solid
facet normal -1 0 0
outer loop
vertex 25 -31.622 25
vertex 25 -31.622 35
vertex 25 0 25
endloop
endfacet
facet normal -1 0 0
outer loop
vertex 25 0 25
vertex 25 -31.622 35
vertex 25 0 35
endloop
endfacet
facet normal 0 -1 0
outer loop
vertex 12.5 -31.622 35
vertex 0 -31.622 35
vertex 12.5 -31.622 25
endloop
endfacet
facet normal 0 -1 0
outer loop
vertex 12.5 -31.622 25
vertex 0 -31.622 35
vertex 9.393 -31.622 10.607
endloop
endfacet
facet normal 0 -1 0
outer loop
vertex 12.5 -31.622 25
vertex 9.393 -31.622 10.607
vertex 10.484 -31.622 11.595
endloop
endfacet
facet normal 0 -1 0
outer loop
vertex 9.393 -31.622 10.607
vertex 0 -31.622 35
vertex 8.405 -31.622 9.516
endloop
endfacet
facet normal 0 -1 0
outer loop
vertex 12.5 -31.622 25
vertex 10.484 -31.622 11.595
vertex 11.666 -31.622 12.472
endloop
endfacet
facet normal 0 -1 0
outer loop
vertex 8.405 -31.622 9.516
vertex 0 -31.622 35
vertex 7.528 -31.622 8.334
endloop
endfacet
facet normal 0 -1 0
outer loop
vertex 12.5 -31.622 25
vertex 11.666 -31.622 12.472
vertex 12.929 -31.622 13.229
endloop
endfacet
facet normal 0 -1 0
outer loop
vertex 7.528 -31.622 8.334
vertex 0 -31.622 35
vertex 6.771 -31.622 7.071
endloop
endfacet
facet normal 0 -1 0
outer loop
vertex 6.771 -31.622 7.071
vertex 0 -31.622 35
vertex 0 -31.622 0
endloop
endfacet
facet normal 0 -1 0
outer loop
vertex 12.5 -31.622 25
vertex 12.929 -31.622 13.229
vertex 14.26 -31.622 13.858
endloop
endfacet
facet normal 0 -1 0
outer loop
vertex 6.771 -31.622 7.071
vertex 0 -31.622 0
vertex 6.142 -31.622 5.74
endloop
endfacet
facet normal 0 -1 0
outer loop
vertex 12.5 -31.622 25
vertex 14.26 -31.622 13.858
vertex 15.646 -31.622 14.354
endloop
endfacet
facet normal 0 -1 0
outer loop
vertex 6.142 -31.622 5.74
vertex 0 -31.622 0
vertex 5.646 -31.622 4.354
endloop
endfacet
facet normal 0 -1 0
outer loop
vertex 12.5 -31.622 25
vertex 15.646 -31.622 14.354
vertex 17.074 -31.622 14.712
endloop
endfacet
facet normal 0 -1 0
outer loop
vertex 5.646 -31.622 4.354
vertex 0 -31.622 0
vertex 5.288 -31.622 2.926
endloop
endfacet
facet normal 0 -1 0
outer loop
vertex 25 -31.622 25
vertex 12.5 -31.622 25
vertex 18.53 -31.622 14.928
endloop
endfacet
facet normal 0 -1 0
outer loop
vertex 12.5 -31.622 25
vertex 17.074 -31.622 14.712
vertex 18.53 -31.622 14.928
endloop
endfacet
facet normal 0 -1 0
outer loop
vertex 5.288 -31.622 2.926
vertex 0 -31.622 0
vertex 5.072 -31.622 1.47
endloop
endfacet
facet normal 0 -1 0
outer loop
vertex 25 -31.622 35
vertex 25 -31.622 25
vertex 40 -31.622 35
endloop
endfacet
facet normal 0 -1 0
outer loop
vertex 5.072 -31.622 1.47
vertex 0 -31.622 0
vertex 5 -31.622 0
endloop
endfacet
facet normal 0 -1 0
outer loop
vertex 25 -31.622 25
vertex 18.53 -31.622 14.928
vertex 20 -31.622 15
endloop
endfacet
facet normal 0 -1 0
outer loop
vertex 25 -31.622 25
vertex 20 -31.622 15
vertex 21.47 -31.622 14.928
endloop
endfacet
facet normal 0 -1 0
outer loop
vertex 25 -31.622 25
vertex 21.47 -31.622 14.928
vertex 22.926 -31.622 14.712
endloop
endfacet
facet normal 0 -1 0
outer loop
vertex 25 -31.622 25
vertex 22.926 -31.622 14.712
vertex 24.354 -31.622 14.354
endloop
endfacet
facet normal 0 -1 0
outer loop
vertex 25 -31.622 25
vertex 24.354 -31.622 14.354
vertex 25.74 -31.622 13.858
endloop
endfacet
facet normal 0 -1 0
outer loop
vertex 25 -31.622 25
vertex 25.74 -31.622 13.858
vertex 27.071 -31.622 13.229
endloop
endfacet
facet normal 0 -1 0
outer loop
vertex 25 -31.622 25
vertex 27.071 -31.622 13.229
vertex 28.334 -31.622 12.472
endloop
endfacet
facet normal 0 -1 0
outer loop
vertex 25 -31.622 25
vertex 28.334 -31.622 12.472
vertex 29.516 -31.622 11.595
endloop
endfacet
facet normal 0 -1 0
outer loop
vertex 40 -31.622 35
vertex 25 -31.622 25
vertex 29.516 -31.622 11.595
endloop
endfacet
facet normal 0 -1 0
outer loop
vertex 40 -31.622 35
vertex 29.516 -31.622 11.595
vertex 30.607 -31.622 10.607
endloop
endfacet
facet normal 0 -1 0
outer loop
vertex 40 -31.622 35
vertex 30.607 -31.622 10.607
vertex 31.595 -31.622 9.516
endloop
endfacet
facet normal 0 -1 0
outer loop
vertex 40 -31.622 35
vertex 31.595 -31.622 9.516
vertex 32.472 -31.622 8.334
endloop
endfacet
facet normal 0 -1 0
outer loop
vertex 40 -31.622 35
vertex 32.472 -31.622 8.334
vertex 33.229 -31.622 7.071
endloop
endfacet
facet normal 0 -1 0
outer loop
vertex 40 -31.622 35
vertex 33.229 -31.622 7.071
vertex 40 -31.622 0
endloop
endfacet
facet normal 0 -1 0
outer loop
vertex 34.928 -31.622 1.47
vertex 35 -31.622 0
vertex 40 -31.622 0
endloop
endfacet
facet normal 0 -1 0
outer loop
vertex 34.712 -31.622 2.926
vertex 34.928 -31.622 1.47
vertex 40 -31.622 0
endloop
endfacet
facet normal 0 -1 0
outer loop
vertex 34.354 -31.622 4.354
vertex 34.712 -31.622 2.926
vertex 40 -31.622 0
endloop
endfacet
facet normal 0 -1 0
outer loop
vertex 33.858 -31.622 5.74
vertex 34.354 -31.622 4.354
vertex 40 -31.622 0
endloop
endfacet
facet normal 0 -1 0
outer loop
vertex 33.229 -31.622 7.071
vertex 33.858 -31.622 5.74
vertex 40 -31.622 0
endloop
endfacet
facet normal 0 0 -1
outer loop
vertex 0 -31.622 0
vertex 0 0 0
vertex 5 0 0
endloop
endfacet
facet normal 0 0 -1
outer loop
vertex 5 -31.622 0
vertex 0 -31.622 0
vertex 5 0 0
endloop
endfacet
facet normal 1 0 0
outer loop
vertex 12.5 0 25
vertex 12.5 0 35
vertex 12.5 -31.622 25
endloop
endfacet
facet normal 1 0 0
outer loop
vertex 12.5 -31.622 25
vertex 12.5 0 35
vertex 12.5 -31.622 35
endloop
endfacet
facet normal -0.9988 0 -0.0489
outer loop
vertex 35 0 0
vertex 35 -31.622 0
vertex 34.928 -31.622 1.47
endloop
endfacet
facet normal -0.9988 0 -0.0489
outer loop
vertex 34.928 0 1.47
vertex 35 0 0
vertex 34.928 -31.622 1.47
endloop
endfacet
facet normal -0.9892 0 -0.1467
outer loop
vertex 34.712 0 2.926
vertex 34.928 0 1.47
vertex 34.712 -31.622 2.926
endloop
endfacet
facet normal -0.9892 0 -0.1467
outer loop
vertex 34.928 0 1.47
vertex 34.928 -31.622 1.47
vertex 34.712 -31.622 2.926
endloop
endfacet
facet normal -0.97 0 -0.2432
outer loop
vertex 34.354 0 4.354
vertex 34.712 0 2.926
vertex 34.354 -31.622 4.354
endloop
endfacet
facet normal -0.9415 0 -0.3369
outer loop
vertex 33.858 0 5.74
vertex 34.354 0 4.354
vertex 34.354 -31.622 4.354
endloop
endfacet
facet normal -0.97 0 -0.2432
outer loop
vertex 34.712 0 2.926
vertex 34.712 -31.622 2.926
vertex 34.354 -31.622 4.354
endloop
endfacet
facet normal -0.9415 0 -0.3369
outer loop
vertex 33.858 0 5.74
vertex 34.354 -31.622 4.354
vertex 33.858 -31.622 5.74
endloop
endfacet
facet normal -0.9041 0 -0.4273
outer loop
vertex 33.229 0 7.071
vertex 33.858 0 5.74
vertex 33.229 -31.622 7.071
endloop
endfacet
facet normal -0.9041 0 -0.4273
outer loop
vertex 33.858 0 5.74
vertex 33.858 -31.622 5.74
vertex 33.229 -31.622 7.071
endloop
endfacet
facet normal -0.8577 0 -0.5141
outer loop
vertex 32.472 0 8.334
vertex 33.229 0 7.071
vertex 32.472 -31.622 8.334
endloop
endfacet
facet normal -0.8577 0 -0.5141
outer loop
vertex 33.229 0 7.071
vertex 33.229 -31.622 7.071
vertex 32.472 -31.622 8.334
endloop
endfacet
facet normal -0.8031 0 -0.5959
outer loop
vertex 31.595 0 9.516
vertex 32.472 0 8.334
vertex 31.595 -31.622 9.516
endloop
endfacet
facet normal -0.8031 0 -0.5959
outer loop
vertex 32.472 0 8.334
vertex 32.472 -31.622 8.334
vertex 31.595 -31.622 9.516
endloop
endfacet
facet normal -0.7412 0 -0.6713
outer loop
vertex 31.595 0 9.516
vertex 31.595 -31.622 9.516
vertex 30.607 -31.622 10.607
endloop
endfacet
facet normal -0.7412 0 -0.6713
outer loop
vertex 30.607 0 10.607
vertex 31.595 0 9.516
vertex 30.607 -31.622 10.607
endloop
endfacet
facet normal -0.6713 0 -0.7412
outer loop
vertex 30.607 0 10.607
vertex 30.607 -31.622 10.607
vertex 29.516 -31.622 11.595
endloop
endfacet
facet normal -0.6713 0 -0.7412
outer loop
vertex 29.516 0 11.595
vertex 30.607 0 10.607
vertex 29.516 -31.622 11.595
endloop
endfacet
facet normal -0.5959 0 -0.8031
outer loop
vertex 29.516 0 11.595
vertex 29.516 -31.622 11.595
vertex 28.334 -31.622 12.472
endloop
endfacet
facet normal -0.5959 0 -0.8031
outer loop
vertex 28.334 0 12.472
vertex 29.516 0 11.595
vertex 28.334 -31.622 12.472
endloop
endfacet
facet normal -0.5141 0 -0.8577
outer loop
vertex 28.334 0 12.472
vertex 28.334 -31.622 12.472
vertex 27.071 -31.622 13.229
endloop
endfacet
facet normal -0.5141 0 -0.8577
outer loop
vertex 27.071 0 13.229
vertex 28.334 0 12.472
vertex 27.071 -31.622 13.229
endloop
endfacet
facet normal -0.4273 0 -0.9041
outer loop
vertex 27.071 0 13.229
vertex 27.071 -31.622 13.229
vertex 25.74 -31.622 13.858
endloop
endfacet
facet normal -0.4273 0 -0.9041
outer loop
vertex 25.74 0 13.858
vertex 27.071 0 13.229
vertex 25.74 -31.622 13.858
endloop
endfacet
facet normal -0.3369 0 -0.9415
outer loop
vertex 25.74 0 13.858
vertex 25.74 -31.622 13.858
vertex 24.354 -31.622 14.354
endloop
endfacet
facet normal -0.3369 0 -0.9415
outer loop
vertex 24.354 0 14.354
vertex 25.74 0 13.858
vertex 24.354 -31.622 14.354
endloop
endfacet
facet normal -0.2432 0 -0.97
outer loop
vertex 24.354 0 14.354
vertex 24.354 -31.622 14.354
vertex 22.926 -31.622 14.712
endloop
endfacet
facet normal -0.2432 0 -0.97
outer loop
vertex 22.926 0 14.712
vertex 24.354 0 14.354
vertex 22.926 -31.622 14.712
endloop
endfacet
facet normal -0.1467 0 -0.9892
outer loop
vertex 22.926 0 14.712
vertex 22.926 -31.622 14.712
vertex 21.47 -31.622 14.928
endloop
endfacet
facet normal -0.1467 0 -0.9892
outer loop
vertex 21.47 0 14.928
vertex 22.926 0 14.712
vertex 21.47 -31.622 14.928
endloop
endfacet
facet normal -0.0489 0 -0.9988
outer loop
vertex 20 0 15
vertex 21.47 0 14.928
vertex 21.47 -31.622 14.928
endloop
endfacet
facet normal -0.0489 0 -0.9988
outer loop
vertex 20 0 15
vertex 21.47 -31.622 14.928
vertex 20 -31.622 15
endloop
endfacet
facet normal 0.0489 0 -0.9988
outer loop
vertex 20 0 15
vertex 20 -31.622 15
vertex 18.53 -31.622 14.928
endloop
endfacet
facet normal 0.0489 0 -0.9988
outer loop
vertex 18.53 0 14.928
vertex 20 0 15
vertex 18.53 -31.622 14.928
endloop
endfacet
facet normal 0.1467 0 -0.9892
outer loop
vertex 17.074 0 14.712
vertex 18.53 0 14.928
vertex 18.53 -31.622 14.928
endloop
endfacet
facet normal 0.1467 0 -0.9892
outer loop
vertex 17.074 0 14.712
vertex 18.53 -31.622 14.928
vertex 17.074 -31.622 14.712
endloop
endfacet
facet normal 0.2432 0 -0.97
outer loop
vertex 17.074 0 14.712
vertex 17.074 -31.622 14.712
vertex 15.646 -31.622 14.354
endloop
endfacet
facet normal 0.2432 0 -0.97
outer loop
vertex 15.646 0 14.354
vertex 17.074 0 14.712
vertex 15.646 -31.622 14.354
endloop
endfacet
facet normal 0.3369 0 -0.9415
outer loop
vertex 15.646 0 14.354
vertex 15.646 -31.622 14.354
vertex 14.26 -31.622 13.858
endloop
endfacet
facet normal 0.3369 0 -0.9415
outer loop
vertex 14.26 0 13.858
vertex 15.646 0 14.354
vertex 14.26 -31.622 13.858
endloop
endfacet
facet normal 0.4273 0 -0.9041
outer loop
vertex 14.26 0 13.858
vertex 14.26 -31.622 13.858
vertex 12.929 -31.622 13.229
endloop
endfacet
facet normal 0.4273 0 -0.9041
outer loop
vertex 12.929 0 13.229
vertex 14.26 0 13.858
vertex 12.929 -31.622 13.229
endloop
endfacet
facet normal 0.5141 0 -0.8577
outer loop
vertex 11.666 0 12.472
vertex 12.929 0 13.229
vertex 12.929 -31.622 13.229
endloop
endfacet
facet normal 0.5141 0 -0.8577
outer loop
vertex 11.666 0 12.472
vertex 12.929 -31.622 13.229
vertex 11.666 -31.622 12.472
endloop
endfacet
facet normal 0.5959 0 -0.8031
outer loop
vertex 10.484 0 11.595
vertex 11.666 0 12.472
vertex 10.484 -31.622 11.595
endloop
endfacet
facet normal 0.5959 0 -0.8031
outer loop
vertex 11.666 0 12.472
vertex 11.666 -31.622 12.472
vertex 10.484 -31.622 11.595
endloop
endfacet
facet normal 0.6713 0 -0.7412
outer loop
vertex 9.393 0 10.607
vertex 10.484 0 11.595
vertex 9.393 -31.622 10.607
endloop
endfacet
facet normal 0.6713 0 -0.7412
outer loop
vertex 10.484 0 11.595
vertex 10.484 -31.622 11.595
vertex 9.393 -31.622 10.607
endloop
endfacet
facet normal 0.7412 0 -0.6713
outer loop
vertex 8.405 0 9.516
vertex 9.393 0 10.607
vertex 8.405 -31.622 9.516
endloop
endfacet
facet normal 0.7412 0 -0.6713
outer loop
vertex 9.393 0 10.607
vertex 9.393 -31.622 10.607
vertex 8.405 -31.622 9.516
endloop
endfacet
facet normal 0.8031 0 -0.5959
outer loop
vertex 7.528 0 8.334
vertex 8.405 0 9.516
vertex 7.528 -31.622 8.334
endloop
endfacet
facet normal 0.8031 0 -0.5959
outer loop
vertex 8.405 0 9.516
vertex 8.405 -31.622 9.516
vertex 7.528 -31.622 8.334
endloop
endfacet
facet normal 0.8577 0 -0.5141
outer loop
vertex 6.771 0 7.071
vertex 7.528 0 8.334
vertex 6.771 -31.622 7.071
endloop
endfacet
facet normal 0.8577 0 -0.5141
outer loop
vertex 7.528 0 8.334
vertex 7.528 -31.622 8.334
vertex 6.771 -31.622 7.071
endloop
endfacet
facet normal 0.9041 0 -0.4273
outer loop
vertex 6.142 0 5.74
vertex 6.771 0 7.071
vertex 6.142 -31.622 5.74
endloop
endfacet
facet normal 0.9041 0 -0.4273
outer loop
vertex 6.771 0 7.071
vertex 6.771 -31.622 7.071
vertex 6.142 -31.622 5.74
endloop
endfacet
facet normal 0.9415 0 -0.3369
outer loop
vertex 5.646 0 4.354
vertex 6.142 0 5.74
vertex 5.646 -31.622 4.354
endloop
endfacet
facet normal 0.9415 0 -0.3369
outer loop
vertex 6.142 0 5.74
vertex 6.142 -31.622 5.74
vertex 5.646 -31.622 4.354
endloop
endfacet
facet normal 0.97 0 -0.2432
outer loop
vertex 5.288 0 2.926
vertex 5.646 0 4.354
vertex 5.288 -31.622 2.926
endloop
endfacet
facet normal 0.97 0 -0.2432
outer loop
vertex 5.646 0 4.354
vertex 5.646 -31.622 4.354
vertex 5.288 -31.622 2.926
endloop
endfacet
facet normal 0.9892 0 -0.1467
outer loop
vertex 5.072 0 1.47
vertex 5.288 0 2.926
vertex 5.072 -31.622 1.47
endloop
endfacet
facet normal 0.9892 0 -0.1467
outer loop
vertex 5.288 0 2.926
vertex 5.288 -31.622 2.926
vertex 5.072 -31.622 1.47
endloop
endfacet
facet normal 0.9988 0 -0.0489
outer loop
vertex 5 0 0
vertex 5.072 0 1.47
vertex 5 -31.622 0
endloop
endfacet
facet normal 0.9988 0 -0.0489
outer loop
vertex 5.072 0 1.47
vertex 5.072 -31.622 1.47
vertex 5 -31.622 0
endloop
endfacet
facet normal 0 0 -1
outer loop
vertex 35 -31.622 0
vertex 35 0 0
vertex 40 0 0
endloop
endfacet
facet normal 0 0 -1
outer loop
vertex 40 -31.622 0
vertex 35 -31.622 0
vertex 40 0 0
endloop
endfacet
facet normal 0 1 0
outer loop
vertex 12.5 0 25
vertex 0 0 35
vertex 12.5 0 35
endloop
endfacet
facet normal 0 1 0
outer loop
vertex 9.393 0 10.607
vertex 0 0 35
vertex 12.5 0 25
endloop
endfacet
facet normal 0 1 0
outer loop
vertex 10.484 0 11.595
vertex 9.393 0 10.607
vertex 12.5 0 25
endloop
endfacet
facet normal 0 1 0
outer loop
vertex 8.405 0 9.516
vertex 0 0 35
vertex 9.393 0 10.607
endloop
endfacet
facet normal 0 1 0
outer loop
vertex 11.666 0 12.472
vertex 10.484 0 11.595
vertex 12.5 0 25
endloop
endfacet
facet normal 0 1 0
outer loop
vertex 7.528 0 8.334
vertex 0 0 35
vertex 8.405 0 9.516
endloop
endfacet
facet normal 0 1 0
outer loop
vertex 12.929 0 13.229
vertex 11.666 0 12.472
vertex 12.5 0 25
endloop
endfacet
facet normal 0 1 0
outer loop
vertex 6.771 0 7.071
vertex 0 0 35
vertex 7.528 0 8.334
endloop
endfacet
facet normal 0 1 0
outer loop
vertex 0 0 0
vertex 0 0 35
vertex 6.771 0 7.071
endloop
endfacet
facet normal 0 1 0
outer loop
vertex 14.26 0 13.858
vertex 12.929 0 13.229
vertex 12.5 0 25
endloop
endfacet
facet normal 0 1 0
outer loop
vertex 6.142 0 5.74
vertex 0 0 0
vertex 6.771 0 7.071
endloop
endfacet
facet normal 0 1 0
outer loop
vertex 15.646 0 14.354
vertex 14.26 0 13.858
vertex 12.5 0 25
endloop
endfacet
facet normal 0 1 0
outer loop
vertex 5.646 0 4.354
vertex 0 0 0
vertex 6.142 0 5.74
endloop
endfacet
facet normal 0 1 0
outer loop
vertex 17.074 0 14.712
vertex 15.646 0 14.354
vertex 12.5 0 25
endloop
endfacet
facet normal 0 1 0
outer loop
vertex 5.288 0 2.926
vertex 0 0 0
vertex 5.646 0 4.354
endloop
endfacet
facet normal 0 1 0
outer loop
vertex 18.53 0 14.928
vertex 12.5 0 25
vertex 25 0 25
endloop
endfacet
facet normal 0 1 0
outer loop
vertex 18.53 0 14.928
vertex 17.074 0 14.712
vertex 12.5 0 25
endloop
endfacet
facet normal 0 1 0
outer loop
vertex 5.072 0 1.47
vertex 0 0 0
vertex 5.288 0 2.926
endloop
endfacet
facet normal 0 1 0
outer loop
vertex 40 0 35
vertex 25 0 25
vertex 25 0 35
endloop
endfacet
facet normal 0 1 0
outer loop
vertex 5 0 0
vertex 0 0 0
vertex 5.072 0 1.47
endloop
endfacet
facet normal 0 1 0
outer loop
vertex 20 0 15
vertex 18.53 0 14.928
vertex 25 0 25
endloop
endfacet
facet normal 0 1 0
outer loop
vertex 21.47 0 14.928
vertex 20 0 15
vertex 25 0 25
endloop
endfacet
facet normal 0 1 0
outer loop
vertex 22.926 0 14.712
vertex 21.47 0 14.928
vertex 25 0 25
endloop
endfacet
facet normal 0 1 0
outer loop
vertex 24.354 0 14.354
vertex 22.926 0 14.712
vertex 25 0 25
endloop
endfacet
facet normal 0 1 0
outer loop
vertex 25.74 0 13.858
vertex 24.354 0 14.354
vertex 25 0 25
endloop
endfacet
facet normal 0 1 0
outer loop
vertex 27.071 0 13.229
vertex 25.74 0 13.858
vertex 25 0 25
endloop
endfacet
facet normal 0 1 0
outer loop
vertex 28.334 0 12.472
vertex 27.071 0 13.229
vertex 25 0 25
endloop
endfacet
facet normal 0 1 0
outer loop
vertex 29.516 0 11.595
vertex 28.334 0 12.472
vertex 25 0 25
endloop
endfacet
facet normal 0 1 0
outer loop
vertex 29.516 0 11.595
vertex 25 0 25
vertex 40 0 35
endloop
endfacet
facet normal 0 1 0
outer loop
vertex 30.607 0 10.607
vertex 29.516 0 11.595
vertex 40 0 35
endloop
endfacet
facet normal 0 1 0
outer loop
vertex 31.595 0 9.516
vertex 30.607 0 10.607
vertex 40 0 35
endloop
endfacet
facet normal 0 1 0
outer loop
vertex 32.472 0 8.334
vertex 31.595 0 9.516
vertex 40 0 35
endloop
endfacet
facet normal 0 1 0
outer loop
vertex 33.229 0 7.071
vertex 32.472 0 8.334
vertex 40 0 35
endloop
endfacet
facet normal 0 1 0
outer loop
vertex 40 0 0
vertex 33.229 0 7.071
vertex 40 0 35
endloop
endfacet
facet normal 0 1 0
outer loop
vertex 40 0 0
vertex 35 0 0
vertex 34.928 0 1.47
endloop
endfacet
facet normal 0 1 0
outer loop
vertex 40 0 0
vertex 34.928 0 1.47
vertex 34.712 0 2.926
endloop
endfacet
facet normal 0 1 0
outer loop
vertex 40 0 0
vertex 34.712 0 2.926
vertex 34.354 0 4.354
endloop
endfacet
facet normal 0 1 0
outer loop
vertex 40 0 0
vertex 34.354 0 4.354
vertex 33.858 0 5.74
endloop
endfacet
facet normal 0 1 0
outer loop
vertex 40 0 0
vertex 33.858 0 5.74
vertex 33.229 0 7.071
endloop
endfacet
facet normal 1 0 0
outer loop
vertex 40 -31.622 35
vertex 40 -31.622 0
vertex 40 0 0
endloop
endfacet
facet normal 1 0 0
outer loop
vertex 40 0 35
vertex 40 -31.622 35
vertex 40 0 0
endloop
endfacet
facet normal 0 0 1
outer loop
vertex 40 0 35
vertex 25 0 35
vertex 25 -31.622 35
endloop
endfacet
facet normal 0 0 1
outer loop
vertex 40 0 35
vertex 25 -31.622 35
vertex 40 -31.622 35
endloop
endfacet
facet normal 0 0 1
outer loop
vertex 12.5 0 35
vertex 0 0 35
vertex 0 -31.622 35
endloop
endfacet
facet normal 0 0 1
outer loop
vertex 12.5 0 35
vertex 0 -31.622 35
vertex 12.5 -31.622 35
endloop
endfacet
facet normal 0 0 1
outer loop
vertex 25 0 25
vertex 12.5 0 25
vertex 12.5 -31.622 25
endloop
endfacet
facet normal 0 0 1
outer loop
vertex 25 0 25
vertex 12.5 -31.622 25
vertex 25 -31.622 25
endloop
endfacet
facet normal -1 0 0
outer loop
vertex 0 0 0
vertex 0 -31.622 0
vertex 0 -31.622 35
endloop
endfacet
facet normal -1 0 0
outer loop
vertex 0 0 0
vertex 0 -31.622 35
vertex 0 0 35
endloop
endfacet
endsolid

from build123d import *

# Parameters (mm, degrees)
F0_W     = 40
F0_H     = 31.621624
F1_DEPTH = 35
F3_DEPTH = 10
F5_DEPTH = 40


with BuildPart() as f1:
    # F0 (on Top) → F1 (new body)
    with BuildSketch(Plane.XY):
        with Locations((20, -15.810812)):
            Rectangle(F0_W, F0_H)
    extrude(amount=F1_DEPTH)

    # F2 (on face) → F3 (cut)
    with BuildSketch(Plane.XY.offset(35)):
        Polygon((25, -31.621624), (25, -18.624302), (25, 0), (12.5, 0), (12.5, -18.326312), (12.5, -31.621624), align=None)
    extrude(amount=-F3_DEPTH, mode=Mode.SUBTRACT)

    # F4 (on face) → F5 (cut)
    with BuildSketch(Plane.XZ.offset(31.621624)):
        with BuildLine():
            Line((5, 0), (35, 0))
            ThreePointArc((35, 0), (20, 15), (5, 0))
        make_face()
    extrude(amount=-F5_DEPTH, mode=Mode.SUBTRACT)


solid = f1.part
